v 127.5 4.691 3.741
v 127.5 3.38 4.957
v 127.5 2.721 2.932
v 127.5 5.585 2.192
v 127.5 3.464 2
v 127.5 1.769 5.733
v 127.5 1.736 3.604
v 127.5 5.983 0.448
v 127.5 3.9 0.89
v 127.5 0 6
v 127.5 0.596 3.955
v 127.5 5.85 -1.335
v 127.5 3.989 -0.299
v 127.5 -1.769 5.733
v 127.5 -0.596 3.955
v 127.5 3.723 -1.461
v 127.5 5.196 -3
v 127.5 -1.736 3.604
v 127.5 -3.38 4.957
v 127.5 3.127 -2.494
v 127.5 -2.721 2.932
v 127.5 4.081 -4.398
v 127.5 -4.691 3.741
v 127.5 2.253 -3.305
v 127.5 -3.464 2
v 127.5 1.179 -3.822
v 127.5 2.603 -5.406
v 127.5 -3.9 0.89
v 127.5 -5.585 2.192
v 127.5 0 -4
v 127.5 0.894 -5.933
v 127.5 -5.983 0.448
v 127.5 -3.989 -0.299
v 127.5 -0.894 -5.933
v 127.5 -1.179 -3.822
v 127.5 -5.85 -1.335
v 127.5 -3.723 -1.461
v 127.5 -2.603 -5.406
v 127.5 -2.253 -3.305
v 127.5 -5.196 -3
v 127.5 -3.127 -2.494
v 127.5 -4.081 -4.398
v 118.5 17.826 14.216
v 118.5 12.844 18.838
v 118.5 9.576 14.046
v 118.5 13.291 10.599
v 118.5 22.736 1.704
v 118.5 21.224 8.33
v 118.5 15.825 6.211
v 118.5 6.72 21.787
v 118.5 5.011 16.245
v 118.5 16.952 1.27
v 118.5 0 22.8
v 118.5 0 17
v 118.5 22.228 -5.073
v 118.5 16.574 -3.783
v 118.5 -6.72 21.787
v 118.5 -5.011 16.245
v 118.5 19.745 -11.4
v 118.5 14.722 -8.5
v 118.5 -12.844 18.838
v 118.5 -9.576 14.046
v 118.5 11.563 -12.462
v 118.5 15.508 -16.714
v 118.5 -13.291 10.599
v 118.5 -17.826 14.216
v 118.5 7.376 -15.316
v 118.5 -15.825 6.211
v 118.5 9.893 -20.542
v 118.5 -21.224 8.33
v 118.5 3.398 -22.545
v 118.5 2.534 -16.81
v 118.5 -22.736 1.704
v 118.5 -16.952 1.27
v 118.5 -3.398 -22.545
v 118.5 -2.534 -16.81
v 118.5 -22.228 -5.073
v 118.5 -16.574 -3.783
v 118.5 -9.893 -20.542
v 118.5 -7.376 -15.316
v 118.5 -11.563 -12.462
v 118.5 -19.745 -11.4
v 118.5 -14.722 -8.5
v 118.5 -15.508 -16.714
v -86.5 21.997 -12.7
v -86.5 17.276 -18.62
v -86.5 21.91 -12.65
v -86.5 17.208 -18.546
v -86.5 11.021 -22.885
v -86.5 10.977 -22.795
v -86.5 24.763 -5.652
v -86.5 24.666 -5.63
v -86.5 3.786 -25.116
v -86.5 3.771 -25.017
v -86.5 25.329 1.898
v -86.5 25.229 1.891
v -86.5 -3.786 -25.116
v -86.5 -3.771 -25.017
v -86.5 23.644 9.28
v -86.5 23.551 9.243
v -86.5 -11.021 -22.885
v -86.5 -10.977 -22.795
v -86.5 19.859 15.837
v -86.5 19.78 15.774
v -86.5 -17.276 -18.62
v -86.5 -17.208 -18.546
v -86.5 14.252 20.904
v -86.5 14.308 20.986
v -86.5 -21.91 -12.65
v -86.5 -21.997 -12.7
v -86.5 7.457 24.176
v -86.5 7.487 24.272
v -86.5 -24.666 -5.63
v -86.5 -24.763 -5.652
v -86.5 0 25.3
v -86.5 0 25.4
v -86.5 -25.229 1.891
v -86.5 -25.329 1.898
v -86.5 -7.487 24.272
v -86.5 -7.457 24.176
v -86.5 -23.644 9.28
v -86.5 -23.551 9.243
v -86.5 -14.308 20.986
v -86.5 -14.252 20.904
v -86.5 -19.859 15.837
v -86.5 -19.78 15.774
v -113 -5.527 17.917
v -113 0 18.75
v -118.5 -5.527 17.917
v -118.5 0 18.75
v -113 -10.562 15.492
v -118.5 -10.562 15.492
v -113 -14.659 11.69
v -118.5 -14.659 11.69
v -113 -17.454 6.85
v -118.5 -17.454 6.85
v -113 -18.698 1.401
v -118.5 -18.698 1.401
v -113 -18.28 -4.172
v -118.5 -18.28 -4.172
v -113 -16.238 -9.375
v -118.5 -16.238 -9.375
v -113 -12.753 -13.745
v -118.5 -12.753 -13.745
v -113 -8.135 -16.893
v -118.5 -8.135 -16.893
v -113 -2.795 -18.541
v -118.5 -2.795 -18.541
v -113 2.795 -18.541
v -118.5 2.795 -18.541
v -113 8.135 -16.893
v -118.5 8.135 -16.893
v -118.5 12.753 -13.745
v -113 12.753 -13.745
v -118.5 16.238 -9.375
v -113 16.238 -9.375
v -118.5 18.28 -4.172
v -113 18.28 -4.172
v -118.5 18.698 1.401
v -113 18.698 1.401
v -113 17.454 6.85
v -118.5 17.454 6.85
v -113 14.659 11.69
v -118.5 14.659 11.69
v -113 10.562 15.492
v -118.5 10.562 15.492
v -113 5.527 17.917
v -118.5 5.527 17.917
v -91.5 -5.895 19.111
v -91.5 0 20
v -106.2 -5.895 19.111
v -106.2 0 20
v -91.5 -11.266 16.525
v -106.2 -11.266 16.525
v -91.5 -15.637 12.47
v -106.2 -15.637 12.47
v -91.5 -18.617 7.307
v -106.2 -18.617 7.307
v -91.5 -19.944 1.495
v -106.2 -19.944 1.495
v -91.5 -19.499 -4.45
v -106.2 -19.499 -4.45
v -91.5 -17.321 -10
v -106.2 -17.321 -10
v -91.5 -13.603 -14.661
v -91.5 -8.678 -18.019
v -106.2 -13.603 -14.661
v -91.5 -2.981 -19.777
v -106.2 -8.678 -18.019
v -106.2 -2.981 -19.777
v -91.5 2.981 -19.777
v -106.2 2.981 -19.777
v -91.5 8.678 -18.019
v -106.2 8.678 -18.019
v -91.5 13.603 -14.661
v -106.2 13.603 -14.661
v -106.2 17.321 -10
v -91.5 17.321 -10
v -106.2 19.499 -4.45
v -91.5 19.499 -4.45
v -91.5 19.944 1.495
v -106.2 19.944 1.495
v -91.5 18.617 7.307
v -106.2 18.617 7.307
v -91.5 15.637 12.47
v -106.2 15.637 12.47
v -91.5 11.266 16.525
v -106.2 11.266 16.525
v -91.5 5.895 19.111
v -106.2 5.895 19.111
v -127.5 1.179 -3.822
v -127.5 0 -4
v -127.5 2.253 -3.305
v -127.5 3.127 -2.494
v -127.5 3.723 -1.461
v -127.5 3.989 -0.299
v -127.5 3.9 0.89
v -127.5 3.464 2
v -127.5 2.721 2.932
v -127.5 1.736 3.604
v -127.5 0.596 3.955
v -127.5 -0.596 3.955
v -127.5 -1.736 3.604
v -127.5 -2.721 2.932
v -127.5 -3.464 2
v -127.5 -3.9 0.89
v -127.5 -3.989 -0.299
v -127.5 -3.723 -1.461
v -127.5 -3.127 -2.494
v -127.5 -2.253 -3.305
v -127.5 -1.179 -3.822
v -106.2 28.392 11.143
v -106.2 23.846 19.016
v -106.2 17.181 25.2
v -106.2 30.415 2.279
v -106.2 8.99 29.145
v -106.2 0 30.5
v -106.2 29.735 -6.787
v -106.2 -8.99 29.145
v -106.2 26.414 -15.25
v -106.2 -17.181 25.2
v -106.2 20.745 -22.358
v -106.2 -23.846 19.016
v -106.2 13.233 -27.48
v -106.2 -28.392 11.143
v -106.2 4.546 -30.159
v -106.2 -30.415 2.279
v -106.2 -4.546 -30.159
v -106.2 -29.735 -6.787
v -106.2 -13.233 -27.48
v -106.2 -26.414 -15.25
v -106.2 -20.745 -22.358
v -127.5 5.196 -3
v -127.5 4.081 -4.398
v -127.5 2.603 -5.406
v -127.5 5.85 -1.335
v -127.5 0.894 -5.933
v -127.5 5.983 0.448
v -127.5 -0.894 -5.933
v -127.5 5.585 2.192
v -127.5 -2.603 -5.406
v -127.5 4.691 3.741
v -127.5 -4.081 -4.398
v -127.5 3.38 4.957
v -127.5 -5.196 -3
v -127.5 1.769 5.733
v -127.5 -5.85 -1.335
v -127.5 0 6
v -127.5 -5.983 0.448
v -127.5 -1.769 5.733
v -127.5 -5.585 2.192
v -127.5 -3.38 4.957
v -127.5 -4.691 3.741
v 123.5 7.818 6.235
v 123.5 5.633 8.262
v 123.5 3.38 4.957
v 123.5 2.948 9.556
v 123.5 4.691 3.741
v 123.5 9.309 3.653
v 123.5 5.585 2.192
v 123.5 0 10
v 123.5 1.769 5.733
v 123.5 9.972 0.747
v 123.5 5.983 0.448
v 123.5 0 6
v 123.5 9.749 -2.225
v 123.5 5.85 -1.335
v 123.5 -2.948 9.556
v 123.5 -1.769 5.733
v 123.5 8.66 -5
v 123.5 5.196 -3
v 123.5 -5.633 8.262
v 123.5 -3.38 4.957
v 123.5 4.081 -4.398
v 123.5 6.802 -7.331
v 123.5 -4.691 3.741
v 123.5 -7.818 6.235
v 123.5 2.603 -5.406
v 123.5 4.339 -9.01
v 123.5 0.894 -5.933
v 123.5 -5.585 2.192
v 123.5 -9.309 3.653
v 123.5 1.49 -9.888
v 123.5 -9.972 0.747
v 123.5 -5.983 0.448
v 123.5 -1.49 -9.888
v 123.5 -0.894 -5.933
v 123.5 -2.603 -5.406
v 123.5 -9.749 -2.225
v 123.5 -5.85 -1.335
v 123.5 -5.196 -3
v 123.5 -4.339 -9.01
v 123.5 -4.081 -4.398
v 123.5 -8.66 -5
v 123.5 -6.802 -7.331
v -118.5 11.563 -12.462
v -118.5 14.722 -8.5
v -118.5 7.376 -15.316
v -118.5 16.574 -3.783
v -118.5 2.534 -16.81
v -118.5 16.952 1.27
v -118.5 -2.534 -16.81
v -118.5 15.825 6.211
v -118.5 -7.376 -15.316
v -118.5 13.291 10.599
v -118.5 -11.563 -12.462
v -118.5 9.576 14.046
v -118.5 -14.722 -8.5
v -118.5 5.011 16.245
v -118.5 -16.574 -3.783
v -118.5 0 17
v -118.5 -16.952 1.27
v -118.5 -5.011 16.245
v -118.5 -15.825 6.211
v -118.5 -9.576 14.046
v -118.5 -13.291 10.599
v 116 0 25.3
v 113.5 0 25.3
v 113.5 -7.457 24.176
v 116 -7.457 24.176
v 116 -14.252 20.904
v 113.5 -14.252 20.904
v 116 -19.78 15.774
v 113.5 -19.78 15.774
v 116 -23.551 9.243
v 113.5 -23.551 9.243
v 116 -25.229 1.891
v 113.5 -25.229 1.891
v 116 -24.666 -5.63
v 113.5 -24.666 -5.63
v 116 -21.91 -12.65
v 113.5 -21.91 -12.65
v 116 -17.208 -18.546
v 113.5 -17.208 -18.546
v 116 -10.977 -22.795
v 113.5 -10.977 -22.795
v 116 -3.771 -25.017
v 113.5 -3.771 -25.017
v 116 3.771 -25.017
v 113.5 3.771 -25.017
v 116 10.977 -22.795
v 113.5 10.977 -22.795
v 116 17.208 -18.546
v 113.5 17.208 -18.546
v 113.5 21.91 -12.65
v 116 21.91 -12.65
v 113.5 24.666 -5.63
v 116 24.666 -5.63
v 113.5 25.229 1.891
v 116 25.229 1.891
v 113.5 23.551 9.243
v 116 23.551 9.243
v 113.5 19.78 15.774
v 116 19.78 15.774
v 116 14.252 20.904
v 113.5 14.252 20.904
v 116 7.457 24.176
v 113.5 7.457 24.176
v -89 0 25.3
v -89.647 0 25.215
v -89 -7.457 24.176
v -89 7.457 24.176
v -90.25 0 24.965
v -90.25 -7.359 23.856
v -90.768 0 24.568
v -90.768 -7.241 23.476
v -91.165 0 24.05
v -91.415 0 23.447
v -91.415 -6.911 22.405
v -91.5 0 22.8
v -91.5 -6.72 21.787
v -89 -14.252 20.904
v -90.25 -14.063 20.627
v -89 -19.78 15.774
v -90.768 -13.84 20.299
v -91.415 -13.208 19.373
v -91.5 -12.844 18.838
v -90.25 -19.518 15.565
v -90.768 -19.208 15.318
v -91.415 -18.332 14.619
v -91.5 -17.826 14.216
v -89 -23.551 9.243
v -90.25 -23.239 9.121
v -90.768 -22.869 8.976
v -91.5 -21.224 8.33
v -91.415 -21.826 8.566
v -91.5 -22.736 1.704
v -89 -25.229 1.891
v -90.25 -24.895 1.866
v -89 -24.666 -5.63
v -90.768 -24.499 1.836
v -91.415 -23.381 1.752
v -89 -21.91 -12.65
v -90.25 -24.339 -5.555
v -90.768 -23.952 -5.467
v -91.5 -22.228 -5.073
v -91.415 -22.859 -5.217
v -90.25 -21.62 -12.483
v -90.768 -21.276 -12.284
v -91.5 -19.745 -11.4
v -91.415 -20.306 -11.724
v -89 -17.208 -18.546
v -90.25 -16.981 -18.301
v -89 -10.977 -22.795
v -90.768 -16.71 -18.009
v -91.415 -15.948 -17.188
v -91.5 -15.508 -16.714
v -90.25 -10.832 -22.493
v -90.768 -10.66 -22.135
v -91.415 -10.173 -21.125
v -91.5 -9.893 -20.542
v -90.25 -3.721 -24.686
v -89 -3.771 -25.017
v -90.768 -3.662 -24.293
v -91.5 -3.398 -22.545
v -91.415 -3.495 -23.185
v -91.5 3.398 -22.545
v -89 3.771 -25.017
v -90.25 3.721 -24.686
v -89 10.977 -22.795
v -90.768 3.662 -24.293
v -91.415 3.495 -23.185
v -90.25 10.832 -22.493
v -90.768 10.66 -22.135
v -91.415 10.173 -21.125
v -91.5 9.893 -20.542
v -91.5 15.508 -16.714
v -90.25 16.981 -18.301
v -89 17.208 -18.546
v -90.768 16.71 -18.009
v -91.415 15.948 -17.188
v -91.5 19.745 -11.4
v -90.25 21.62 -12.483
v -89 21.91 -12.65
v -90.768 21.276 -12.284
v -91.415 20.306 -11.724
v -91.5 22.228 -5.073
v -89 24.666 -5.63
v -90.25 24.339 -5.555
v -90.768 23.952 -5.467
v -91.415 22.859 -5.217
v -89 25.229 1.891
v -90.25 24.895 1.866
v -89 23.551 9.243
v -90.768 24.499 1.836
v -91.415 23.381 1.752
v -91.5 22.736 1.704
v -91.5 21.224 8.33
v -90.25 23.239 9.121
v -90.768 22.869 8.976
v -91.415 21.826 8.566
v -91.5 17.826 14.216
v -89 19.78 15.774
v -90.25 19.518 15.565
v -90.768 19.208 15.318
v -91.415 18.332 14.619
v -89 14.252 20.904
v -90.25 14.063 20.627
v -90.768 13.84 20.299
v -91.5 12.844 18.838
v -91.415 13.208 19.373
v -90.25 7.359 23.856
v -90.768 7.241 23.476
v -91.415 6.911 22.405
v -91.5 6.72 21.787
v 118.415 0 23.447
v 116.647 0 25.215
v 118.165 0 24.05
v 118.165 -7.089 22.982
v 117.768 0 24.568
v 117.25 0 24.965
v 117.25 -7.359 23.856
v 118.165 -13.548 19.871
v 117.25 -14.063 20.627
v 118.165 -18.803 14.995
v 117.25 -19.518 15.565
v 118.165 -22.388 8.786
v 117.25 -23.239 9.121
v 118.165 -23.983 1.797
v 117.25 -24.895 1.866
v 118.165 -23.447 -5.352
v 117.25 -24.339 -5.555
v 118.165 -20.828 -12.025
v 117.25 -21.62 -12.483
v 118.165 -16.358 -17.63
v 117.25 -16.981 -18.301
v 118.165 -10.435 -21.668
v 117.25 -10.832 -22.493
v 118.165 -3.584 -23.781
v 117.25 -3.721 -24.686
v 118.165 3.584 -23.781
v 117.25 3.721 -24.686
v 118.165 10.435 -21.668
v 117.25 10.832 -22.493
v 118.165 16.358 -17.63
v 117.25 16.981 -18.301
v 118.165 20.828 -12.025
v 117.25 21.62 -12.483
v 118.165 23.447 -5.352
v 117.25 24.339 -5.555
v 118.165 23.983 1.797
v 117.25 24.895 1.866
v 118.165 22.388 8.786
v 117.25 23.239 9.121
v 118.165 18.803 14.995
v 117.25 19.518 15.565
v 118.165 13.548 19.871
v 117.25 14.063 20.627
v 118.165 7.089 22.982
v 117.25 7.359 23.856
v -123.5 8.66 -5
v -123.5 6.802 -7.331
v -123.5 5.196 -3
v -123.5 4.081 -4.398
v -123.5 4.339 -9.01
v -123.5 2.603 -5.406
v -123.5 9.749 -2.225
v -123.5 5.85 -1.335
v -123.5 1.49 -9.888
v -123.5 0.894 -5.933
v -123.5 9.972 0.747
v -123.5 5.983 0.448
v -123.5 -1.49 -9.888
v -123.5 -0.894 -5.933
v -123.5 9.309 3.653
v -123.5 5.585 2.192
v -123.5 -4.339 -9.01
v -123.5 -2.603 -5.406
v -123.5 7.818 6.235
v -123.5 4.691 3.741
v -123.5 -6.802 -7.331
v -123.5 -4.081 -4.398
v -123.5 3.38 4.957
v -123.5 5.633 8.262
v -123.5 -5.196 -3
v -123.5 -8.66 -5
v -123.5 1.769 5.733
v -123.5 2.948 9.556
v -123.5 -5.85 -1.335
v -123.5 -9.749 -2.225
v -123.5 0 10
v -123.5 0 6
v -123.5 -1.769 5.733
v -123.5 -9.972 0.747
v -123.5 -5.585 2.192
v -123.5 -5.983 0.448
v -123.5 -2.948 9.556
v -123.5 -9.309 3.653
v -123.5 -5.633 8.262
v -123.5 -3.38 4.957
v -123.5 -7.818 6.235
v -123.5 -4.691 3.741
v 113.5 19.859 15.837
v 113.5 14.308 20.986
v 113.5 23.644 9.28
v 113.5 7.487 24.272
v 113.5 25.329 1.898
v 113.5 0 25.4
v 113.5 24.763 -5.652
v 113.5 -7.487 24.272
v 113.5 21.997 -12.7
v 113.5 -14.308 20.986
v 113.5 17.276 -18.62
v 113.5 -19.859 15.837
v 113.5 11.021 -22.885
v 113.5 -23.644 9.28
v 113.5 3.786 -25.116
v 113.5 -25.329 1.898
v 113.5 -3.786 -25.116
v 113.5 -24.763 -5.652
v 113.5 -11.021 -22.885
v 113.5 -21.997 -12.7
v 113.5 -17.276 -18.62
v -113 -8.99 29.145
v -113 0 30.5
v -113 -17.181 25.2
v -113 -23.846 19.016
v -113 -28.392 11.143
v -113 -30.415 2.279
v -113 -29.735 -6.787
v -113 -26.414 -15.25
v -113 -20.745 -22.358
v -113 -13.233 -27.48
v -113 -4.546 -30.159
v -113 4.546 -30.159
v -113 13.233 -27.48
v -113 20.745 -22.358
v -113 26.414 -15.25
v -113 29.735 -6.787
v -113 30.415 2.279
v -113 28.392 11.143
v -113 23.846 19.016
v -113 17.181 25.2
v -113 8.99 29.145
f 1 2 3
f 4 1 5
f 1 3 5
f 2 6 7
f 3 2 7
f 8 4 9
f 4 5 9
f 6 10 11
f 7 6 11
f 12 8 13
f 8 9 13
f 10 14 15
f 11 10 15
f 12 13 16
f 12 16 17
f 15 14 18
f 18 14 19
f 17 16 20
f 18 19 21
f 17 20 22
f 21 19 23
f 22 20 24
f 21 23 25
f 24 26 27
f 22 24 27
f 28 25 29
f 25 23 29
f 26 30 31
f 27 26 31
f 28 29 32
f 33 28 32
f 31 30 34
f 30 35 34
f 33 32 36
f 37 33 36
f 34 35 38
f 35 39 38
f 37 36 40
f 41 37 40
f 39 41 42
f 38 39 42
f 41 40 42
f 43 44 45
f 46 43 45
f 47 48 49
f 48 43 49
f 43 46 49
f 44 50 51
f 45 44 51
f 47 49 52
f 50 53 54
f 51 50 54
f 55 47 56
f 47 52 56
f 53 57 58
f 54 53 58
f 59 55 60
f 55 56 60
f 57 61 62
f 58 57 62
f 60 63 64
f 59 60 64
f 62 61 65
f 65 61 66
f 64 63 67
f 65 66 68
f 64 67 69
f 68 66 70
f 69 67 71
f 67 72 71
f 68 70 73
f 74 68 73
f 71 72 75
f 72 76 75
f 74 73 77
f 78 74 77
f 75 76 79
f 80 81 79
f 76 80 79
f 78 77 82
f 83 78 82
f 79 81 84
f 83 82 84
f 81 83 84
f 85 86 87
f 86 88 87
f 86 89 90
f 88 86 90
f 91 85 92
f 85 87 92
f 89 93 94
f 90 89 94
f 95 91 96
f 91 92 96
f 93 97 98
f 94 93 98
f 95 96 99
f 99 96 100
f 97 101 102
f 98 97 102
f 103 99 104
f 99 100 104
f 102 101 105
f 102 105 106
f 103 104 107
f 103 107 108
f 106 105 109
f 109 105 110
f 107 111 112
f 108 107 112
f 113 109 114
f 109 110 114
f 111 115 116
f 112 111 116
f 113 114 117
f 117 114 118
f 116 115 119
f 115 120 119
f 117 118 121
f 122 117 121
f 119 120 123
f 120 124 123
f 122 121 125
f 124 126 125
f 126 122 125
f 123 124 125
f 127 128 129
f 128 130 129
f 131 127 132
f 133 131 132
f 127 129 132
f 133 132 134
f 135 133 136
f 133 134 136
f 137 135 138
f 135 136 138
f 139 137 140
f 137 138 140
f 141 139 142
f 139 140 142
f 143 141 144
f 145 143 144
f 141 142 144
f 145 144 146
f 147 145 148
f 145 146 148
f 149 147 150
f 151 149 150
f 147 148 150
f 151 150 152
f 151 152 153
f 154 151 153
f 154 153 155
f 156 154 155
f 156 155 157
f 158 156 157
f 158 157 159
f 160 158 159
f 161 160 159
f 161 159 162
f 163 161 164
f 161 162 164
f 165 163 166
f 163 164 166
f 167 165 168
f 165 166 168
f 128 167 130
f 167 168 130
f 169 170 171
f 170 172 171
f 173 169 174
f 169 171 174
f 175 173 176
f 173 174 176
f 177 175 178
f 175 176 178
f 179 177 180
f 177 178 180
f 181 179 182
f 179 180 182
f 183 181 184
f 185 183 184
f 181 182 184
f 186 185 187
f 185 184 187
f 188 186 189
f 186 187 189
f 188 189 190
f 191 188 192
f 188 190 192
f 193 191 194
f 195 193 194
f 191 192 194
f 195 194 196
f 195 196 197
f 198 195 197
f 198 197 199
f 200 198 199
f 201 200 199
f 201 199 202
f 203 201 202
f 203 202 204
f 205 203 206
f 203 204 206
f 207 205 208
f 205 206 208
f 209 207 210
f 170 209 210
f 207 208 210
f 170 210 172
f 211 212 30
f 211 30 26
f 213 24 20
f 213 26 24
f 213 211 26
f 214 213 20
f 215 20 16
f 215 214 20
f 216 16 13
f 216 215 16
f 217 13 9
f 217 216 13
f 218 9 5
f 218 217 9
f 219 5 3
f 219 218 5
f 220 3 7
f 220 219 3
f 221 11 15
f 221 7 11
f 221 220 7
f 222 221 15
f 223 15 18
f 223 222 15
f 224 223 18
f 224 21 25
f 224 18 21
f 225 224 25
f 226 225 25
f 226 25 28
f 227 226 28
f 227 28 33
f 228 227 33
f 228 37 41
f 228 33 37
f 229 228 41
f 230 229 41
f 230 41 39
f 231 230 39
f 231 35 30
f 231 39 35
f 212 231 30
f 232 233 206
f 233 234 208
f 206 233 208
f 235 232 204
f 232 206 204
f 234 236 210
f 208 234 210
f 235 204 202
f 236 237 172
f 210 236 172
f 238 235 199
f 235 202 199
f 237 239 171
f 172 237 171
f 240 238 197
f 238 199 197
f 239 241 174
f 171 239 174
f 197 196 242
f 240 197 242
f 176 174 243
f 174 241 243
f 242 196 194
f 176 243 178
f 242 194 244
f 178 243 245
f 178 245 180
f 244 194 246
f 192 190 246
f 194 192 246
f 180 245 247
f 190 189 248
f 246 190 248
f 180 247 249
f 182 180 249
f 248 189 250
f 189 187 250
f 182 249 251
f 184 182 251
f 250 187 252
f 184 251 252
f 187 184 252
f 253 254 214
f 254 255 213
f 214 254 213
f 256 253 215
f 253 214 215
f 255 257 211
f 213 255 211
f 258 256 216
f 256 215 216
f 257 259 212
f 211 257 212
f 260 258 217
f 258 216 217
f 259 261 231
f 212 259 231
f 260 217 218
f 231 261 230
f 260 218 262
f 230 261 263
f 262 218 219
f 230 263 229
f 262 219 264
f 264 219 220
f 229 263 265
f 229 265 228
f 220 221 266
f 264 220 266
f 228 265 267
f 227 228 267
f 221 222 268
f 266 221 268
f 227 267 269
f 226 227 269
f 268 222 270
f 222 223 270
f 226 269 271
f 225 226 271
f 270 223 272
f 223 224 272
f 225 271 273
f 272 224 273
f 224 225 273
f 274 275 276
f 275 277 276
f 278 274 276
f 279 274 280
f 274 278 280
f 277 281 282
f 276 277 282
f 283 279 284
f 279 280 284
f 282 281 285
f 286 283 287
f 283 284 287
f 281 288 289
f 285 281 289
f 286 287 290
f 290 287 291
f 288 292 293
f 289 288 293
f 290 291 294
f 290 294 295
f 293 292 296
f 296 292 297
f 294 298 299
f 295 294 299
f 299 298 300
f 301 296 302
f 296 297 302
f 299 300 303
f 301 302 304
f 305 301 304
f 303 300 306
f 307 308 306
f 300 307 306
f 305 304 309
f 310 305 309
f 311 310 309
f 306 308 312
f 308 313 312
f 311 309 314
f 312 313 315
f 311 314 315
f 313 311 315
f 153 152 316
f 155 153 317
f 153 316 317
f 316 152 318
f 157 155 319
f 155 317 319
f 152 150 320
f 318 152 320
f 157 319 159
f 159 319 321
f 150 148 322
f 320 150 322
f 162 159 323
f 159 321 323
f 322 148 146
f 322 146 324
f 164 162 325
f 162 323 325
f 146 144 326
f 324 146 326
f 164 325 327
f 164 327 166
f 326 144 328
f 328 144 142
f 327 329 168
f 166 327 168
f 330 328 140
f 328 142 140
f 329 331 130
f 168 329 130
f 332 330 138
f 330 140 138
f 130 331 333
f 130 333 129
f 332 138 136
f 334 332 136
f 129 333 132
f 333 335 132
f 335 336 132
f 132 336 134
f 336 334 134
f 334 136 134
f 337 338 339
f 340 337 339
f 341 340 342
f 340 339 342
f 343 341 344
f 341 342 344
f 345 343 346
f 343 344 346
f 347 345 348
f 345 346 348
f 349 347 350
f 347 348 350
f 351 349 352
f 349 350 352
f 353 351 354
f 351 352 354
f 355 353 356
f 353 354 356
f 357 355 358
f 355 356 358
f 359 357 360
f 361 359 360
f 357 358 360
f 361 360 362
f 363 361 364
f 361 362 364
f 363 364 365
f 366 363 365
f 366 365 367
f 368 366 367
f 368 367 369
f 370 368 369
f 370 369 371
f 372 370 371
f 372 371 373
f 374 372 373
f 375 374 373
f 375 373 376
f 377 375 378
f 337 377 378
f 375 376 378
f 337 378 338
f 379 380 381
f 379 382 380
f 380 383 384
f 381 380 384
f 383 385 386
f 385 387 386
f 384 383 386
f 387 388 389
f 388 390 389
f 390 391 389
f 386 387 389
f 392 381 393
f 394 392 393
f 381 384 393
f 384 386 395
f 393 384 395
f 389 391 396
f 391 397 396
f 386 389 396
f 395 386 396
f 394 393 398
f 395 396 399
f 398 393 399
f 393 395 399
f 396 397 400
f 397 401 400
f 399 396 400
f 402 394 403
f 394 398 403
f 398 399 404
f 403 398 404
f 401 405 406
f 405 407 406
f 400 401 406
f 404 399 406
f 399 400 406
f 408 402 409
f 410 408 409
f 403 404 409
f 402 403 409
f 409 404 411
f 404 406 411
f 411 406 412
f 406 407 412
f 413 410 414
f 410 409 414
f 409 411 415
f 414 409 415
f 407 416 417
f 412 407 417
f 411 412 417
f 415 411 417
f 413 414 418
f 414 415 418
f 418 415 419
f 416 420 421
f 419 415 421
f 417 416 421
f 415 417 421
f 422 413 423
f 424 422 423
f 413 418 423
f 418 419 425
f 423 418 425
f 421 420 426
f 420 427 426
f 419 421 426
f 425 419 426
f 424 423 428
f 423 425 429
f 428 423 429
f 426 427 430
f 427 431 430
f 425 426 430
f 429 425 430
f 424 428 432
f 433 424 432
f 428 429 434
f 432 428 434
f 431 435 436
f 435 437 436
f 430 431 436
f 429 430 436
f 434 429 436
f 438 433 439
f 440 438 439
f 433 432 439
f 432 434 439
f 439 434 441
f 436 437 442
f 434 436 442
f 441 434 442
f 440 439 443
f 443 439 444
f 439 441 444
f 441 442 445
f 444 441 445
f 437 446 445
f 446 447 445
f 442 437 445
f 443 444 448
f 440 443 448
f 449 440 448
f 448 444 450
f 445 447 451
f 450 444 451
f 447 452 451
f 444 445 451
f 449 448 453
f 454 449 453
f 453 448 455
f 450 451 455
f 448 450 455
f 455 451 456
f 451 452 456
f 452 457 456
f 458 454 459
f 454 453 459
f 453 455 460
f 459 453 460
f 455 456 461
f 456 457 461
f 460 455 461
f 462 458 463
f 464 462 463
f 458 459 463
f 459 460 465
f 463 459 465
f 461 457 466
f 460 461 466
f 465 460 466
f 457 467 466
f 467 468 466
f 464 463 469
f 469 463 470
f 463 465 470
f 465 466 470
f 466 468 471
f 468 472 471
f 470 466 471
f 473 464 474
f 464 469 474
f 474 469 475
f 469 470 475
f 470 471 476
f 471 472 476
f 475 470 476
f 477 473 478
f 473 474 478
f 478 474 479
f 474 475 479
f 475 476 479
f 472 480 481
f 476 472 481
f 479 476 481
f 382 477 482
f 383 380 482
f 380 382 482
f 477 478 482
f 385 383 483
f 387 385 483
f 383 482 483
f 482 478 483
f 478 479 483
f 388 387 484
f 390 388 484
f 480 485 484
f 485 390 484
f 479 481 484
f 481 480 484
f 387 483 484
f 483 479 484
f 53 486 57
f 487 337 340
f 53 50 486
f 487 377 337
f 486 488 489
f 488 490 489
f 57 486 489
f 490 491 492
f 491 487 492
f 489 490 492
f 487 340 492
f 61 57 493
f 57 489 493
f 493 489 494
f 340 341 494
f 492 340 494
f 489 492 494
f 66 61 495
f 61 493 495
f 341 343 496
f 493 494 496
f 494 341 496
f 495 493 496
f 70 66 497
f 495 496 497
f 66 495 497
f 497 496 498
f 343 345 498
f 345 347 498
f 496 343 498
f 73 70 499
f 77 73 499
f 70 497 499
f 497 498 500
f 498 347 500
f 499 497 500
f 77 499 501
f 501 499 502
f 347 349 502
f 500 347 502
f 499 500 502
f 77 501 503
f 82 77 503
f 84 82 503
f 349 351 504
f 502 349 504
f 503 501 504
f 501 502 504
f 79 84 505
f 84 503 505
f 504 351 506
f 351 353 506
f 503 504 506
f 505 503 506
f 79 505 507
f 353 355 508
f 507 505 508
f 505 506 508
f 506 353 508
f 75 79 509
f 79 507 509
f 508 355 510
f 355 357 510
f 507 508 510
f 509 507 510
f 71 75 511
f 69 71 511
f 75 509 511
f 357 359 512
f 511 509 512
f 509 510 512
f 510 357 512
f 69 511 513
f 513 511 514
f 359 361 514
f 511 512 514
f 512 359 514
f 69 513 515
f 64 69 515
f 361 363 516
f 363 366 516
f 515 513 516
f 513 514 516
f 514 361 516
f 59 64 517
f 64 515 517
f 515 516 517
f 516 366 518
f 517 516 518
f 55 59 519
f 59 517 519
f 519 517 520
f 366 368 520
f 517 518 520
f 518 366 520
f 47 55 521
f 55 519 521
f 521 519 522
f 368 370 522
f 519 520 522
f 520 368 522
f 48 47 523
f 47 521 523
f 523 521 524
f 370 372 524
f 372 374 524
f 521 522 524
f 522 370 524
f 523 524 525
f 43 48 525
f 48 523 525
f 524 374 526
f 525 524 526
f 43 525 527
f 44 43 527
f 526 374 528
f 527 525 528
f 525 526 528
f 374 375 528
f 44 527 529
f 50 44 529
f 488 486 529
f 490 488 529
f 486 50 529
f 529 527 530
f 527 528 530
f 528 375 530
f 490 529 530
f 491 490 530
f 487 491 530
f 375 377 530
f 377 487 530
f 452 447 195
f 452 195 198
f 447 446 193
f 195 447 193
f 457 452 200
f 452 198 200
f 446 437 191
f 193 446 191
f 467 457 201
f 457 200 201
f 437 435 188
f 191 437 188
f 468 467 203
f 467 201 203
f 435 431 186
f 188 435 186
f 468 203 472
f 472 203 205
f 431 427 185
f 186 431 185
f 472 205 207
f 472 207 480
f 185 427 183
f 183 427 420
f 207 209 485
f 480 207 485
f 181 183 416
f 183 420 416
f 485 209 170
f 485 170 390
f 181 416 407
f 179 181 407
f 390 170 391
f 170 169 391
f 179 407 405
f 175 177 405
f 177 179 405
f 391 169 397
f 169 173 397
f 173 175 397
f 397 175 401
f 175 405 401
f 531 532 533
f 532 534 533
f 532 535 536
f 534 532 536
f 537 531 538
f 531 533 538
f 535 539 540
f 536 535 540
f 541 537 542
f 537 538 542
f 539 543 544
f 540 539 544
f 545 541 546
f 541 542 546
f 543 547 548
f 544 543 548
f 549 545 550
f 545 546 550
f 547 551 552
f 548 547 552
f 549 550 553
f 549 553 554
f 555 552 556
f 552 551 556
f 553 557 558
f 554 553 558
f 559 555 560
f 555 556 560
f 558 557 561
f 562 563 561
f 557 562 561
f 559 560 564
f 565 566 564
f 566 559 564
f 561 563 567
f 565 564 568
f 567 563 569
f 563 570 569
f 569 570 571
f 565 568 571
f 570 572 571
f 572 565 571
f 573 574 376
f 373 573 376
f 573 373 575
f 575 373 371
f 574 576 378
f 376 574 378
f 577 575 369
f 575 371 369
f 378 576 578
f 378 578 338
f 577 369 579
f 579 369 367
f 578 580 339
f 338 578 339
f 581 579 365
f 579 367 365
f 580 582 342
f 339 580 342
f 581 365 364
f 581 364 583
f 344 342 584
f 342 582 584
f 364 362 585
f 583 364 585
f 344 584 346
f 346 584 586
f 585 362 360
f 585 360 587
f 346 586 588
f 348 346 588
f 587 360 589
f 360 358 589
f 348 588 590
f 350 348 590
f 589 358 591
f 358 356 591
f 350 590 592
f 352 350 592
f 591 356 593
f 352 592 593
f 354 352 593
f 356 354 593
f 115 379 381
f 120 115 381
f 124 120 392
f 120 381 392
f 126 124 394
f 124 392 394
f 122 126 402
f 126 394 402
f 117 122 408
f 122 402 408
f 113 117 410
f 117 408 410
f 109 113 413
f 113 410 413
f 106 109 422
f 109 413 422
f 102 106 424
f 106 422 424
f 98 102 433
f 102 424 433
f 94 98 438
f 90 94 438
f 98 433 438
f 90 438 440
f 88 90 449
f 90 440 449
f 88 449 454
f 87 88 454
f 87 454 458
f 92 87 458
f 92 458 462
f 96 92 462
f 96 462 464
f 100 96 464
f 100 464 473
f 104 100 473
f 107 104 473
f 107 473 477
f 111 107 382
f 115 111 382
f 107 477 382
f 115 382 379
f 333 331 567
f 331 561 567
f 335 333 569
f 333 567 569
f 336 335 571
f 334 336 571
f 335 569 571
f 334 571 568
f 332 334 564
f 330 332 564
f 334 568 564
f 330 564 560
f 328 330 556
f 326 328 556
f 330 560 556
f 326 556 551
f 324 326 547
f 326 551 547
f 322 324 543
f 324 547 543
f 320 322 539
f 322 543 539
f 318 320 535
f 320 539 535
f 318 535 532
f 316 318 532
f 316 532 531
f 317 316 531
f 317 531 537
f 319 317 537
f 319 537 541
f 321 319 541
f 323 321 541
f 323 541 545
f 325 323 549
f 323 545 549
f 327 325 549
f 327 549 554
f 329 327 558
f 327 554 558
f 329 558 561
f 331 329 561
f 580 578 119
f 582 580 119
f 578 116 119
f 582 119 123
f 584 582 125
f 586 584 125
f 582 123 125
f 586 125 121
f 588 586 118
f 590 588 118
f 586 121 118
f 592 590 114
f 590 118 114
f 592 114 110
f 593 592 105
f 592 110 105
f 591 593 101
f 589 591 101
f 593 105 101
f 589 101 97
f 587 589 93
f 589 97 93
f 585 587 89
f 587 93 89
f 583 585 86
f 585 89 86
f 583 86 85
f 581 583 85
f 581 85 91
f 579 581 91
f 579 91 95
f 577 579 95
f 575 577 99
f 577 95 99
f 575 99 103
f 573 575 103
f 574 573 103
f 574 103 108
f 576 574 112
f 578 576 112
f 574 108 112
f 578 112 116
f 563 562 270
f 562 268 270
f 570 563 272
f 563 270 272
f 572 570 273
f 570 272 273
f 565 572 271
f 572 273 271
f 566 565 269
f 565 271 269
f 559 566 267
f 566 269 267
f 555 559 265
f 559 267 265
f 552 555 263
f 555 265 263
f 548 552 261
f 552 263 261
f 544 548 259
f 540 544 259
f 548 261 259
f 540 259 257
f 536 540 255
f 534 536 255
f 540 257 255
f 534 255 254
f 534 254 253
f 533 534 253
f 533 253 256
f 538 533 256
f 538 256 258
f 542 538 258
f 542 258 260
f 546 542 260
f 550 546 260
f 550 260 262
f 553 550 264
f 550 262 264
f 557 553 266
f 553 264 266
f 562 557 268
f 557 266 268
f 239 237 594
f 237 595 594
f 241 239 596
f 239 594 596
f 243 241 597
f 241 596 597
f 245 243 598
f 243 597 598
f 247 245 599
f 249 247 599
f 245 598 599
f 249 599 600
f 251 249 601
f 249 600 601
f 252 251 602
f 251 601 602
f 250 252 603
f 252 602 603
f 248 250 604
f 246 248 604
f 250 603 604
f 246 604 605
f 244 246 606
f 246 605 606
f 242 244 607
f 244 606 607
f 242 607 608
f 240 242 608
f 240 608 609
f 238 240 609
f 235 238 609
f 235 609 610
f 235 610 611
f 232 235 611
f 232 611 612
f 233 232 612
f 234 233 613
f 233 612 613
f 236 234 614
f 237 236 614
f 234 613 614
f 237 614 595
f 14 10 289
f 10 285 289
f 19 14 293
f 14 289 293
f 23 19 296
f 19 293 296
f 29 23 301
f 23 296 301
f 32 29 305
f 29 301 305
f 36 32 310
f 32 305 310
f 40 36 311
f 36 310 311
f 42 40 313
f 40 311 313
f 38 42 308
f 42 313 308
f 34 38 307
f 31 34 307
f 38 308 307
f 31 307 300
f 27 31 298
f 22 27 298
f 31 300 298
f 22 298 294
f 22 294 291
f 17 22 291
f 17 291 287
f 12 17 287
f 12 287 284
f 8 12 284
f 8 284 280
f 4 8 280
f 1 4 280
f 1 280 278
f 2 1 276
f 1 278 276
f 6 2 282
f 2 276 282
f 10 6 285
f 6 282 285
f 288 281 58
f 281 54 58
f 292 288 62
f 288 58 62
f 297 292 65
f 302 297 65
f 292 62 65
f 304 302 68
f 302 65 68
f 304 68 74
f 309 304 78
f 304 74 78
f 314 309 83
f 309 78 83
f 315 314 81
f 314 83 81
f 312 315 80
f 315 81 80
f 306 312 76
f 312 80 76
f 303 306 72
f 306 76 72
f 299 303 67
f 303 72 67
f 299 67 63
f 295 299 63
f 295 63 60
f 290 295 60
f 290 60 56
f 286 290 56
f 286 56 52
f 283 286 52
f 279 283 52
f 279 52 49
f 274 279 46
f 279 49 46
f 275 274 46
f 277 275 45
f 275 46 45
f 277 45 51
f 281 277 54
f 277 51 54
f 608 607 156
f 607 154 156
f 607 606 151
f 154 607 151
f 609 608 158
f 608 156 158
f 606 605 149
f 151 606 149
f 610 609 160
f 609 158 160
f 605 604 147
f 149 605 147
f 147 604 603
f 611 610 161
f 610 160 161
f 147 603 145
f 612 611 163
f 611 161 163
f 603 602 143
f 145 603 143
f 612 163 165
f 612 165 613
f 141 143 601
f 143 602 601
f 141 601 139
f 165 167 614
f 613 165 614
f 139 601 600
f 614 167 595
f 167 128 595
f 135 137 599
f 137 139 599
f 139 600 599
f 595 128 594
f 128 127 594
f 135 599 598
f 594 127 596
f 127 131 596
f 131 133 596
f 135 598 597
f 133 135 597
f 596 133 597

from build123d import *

# Parameters (mm, degrees)
CUT_EXTRUDE1_DEPTH      = 135.59847696
CUT_EXTRUDE1_DEPTH_BACK = 135.59847696
SKETCH3_R               = 4
FILLET1_R               = 2.5


with BuildPart() as part:
    # Sketch1 → Revolve1 (revolve)
    with BuildSketch(Plane(origin=(0, 0, 0), x_dir=(1, 0, 0), z_dir=(0, 1, 0))):
        Polygon((-127.5, 0), (127.5, 0), (127.5, -6), (123.5, -6), (123.5, -10), (118.5, -17), (118.5, -25.3), (113.5, -25.3), (113.5, -25.4), (-86.5, -25.4), (-86.5, -25.3), (-91.5, -25.3), (-91.5, -20), (-106.2, -20), (-106.2, -30.5), (-113, -30.5), (-113, -18.75), (-118.5, -18.75), (-118.5, -17), (-123.5, -10), (-123.5, -6), (-127.5, -6), align=None)
    revolve(axis=Axis((-127.5, 0, 0), (1, 0, 0)))

    # Sketch3 → Cut-Extrude1 (cut, two sides: drawn at the far end of the back side and taken through both)
    with BuildSketch(Plane(origin=(0, 0, 0), x_dir=(0, 0, -1), z_dir=(1, 0, 0)).offset(-CUT_EXTRUDE1_DEPTH_BACK)):
        Circle(SKETCH3_R)
    extrude(amount=CUT_EXTRUDE1_DEPTH + CUT_EXTRUDE1_DEPTH_BACK, mode=Mode.SUBTRACT)

    # Fillet1
    fillet1_edges = [part.edges().sort_by_distance(p)[0] for p in [
        (-91.5, 0, -25.3),
        (118.5, 0, -25.3),
    ]]
    fillet(fillet1_edges, radius=FILLET1_R)


solid = part.part
